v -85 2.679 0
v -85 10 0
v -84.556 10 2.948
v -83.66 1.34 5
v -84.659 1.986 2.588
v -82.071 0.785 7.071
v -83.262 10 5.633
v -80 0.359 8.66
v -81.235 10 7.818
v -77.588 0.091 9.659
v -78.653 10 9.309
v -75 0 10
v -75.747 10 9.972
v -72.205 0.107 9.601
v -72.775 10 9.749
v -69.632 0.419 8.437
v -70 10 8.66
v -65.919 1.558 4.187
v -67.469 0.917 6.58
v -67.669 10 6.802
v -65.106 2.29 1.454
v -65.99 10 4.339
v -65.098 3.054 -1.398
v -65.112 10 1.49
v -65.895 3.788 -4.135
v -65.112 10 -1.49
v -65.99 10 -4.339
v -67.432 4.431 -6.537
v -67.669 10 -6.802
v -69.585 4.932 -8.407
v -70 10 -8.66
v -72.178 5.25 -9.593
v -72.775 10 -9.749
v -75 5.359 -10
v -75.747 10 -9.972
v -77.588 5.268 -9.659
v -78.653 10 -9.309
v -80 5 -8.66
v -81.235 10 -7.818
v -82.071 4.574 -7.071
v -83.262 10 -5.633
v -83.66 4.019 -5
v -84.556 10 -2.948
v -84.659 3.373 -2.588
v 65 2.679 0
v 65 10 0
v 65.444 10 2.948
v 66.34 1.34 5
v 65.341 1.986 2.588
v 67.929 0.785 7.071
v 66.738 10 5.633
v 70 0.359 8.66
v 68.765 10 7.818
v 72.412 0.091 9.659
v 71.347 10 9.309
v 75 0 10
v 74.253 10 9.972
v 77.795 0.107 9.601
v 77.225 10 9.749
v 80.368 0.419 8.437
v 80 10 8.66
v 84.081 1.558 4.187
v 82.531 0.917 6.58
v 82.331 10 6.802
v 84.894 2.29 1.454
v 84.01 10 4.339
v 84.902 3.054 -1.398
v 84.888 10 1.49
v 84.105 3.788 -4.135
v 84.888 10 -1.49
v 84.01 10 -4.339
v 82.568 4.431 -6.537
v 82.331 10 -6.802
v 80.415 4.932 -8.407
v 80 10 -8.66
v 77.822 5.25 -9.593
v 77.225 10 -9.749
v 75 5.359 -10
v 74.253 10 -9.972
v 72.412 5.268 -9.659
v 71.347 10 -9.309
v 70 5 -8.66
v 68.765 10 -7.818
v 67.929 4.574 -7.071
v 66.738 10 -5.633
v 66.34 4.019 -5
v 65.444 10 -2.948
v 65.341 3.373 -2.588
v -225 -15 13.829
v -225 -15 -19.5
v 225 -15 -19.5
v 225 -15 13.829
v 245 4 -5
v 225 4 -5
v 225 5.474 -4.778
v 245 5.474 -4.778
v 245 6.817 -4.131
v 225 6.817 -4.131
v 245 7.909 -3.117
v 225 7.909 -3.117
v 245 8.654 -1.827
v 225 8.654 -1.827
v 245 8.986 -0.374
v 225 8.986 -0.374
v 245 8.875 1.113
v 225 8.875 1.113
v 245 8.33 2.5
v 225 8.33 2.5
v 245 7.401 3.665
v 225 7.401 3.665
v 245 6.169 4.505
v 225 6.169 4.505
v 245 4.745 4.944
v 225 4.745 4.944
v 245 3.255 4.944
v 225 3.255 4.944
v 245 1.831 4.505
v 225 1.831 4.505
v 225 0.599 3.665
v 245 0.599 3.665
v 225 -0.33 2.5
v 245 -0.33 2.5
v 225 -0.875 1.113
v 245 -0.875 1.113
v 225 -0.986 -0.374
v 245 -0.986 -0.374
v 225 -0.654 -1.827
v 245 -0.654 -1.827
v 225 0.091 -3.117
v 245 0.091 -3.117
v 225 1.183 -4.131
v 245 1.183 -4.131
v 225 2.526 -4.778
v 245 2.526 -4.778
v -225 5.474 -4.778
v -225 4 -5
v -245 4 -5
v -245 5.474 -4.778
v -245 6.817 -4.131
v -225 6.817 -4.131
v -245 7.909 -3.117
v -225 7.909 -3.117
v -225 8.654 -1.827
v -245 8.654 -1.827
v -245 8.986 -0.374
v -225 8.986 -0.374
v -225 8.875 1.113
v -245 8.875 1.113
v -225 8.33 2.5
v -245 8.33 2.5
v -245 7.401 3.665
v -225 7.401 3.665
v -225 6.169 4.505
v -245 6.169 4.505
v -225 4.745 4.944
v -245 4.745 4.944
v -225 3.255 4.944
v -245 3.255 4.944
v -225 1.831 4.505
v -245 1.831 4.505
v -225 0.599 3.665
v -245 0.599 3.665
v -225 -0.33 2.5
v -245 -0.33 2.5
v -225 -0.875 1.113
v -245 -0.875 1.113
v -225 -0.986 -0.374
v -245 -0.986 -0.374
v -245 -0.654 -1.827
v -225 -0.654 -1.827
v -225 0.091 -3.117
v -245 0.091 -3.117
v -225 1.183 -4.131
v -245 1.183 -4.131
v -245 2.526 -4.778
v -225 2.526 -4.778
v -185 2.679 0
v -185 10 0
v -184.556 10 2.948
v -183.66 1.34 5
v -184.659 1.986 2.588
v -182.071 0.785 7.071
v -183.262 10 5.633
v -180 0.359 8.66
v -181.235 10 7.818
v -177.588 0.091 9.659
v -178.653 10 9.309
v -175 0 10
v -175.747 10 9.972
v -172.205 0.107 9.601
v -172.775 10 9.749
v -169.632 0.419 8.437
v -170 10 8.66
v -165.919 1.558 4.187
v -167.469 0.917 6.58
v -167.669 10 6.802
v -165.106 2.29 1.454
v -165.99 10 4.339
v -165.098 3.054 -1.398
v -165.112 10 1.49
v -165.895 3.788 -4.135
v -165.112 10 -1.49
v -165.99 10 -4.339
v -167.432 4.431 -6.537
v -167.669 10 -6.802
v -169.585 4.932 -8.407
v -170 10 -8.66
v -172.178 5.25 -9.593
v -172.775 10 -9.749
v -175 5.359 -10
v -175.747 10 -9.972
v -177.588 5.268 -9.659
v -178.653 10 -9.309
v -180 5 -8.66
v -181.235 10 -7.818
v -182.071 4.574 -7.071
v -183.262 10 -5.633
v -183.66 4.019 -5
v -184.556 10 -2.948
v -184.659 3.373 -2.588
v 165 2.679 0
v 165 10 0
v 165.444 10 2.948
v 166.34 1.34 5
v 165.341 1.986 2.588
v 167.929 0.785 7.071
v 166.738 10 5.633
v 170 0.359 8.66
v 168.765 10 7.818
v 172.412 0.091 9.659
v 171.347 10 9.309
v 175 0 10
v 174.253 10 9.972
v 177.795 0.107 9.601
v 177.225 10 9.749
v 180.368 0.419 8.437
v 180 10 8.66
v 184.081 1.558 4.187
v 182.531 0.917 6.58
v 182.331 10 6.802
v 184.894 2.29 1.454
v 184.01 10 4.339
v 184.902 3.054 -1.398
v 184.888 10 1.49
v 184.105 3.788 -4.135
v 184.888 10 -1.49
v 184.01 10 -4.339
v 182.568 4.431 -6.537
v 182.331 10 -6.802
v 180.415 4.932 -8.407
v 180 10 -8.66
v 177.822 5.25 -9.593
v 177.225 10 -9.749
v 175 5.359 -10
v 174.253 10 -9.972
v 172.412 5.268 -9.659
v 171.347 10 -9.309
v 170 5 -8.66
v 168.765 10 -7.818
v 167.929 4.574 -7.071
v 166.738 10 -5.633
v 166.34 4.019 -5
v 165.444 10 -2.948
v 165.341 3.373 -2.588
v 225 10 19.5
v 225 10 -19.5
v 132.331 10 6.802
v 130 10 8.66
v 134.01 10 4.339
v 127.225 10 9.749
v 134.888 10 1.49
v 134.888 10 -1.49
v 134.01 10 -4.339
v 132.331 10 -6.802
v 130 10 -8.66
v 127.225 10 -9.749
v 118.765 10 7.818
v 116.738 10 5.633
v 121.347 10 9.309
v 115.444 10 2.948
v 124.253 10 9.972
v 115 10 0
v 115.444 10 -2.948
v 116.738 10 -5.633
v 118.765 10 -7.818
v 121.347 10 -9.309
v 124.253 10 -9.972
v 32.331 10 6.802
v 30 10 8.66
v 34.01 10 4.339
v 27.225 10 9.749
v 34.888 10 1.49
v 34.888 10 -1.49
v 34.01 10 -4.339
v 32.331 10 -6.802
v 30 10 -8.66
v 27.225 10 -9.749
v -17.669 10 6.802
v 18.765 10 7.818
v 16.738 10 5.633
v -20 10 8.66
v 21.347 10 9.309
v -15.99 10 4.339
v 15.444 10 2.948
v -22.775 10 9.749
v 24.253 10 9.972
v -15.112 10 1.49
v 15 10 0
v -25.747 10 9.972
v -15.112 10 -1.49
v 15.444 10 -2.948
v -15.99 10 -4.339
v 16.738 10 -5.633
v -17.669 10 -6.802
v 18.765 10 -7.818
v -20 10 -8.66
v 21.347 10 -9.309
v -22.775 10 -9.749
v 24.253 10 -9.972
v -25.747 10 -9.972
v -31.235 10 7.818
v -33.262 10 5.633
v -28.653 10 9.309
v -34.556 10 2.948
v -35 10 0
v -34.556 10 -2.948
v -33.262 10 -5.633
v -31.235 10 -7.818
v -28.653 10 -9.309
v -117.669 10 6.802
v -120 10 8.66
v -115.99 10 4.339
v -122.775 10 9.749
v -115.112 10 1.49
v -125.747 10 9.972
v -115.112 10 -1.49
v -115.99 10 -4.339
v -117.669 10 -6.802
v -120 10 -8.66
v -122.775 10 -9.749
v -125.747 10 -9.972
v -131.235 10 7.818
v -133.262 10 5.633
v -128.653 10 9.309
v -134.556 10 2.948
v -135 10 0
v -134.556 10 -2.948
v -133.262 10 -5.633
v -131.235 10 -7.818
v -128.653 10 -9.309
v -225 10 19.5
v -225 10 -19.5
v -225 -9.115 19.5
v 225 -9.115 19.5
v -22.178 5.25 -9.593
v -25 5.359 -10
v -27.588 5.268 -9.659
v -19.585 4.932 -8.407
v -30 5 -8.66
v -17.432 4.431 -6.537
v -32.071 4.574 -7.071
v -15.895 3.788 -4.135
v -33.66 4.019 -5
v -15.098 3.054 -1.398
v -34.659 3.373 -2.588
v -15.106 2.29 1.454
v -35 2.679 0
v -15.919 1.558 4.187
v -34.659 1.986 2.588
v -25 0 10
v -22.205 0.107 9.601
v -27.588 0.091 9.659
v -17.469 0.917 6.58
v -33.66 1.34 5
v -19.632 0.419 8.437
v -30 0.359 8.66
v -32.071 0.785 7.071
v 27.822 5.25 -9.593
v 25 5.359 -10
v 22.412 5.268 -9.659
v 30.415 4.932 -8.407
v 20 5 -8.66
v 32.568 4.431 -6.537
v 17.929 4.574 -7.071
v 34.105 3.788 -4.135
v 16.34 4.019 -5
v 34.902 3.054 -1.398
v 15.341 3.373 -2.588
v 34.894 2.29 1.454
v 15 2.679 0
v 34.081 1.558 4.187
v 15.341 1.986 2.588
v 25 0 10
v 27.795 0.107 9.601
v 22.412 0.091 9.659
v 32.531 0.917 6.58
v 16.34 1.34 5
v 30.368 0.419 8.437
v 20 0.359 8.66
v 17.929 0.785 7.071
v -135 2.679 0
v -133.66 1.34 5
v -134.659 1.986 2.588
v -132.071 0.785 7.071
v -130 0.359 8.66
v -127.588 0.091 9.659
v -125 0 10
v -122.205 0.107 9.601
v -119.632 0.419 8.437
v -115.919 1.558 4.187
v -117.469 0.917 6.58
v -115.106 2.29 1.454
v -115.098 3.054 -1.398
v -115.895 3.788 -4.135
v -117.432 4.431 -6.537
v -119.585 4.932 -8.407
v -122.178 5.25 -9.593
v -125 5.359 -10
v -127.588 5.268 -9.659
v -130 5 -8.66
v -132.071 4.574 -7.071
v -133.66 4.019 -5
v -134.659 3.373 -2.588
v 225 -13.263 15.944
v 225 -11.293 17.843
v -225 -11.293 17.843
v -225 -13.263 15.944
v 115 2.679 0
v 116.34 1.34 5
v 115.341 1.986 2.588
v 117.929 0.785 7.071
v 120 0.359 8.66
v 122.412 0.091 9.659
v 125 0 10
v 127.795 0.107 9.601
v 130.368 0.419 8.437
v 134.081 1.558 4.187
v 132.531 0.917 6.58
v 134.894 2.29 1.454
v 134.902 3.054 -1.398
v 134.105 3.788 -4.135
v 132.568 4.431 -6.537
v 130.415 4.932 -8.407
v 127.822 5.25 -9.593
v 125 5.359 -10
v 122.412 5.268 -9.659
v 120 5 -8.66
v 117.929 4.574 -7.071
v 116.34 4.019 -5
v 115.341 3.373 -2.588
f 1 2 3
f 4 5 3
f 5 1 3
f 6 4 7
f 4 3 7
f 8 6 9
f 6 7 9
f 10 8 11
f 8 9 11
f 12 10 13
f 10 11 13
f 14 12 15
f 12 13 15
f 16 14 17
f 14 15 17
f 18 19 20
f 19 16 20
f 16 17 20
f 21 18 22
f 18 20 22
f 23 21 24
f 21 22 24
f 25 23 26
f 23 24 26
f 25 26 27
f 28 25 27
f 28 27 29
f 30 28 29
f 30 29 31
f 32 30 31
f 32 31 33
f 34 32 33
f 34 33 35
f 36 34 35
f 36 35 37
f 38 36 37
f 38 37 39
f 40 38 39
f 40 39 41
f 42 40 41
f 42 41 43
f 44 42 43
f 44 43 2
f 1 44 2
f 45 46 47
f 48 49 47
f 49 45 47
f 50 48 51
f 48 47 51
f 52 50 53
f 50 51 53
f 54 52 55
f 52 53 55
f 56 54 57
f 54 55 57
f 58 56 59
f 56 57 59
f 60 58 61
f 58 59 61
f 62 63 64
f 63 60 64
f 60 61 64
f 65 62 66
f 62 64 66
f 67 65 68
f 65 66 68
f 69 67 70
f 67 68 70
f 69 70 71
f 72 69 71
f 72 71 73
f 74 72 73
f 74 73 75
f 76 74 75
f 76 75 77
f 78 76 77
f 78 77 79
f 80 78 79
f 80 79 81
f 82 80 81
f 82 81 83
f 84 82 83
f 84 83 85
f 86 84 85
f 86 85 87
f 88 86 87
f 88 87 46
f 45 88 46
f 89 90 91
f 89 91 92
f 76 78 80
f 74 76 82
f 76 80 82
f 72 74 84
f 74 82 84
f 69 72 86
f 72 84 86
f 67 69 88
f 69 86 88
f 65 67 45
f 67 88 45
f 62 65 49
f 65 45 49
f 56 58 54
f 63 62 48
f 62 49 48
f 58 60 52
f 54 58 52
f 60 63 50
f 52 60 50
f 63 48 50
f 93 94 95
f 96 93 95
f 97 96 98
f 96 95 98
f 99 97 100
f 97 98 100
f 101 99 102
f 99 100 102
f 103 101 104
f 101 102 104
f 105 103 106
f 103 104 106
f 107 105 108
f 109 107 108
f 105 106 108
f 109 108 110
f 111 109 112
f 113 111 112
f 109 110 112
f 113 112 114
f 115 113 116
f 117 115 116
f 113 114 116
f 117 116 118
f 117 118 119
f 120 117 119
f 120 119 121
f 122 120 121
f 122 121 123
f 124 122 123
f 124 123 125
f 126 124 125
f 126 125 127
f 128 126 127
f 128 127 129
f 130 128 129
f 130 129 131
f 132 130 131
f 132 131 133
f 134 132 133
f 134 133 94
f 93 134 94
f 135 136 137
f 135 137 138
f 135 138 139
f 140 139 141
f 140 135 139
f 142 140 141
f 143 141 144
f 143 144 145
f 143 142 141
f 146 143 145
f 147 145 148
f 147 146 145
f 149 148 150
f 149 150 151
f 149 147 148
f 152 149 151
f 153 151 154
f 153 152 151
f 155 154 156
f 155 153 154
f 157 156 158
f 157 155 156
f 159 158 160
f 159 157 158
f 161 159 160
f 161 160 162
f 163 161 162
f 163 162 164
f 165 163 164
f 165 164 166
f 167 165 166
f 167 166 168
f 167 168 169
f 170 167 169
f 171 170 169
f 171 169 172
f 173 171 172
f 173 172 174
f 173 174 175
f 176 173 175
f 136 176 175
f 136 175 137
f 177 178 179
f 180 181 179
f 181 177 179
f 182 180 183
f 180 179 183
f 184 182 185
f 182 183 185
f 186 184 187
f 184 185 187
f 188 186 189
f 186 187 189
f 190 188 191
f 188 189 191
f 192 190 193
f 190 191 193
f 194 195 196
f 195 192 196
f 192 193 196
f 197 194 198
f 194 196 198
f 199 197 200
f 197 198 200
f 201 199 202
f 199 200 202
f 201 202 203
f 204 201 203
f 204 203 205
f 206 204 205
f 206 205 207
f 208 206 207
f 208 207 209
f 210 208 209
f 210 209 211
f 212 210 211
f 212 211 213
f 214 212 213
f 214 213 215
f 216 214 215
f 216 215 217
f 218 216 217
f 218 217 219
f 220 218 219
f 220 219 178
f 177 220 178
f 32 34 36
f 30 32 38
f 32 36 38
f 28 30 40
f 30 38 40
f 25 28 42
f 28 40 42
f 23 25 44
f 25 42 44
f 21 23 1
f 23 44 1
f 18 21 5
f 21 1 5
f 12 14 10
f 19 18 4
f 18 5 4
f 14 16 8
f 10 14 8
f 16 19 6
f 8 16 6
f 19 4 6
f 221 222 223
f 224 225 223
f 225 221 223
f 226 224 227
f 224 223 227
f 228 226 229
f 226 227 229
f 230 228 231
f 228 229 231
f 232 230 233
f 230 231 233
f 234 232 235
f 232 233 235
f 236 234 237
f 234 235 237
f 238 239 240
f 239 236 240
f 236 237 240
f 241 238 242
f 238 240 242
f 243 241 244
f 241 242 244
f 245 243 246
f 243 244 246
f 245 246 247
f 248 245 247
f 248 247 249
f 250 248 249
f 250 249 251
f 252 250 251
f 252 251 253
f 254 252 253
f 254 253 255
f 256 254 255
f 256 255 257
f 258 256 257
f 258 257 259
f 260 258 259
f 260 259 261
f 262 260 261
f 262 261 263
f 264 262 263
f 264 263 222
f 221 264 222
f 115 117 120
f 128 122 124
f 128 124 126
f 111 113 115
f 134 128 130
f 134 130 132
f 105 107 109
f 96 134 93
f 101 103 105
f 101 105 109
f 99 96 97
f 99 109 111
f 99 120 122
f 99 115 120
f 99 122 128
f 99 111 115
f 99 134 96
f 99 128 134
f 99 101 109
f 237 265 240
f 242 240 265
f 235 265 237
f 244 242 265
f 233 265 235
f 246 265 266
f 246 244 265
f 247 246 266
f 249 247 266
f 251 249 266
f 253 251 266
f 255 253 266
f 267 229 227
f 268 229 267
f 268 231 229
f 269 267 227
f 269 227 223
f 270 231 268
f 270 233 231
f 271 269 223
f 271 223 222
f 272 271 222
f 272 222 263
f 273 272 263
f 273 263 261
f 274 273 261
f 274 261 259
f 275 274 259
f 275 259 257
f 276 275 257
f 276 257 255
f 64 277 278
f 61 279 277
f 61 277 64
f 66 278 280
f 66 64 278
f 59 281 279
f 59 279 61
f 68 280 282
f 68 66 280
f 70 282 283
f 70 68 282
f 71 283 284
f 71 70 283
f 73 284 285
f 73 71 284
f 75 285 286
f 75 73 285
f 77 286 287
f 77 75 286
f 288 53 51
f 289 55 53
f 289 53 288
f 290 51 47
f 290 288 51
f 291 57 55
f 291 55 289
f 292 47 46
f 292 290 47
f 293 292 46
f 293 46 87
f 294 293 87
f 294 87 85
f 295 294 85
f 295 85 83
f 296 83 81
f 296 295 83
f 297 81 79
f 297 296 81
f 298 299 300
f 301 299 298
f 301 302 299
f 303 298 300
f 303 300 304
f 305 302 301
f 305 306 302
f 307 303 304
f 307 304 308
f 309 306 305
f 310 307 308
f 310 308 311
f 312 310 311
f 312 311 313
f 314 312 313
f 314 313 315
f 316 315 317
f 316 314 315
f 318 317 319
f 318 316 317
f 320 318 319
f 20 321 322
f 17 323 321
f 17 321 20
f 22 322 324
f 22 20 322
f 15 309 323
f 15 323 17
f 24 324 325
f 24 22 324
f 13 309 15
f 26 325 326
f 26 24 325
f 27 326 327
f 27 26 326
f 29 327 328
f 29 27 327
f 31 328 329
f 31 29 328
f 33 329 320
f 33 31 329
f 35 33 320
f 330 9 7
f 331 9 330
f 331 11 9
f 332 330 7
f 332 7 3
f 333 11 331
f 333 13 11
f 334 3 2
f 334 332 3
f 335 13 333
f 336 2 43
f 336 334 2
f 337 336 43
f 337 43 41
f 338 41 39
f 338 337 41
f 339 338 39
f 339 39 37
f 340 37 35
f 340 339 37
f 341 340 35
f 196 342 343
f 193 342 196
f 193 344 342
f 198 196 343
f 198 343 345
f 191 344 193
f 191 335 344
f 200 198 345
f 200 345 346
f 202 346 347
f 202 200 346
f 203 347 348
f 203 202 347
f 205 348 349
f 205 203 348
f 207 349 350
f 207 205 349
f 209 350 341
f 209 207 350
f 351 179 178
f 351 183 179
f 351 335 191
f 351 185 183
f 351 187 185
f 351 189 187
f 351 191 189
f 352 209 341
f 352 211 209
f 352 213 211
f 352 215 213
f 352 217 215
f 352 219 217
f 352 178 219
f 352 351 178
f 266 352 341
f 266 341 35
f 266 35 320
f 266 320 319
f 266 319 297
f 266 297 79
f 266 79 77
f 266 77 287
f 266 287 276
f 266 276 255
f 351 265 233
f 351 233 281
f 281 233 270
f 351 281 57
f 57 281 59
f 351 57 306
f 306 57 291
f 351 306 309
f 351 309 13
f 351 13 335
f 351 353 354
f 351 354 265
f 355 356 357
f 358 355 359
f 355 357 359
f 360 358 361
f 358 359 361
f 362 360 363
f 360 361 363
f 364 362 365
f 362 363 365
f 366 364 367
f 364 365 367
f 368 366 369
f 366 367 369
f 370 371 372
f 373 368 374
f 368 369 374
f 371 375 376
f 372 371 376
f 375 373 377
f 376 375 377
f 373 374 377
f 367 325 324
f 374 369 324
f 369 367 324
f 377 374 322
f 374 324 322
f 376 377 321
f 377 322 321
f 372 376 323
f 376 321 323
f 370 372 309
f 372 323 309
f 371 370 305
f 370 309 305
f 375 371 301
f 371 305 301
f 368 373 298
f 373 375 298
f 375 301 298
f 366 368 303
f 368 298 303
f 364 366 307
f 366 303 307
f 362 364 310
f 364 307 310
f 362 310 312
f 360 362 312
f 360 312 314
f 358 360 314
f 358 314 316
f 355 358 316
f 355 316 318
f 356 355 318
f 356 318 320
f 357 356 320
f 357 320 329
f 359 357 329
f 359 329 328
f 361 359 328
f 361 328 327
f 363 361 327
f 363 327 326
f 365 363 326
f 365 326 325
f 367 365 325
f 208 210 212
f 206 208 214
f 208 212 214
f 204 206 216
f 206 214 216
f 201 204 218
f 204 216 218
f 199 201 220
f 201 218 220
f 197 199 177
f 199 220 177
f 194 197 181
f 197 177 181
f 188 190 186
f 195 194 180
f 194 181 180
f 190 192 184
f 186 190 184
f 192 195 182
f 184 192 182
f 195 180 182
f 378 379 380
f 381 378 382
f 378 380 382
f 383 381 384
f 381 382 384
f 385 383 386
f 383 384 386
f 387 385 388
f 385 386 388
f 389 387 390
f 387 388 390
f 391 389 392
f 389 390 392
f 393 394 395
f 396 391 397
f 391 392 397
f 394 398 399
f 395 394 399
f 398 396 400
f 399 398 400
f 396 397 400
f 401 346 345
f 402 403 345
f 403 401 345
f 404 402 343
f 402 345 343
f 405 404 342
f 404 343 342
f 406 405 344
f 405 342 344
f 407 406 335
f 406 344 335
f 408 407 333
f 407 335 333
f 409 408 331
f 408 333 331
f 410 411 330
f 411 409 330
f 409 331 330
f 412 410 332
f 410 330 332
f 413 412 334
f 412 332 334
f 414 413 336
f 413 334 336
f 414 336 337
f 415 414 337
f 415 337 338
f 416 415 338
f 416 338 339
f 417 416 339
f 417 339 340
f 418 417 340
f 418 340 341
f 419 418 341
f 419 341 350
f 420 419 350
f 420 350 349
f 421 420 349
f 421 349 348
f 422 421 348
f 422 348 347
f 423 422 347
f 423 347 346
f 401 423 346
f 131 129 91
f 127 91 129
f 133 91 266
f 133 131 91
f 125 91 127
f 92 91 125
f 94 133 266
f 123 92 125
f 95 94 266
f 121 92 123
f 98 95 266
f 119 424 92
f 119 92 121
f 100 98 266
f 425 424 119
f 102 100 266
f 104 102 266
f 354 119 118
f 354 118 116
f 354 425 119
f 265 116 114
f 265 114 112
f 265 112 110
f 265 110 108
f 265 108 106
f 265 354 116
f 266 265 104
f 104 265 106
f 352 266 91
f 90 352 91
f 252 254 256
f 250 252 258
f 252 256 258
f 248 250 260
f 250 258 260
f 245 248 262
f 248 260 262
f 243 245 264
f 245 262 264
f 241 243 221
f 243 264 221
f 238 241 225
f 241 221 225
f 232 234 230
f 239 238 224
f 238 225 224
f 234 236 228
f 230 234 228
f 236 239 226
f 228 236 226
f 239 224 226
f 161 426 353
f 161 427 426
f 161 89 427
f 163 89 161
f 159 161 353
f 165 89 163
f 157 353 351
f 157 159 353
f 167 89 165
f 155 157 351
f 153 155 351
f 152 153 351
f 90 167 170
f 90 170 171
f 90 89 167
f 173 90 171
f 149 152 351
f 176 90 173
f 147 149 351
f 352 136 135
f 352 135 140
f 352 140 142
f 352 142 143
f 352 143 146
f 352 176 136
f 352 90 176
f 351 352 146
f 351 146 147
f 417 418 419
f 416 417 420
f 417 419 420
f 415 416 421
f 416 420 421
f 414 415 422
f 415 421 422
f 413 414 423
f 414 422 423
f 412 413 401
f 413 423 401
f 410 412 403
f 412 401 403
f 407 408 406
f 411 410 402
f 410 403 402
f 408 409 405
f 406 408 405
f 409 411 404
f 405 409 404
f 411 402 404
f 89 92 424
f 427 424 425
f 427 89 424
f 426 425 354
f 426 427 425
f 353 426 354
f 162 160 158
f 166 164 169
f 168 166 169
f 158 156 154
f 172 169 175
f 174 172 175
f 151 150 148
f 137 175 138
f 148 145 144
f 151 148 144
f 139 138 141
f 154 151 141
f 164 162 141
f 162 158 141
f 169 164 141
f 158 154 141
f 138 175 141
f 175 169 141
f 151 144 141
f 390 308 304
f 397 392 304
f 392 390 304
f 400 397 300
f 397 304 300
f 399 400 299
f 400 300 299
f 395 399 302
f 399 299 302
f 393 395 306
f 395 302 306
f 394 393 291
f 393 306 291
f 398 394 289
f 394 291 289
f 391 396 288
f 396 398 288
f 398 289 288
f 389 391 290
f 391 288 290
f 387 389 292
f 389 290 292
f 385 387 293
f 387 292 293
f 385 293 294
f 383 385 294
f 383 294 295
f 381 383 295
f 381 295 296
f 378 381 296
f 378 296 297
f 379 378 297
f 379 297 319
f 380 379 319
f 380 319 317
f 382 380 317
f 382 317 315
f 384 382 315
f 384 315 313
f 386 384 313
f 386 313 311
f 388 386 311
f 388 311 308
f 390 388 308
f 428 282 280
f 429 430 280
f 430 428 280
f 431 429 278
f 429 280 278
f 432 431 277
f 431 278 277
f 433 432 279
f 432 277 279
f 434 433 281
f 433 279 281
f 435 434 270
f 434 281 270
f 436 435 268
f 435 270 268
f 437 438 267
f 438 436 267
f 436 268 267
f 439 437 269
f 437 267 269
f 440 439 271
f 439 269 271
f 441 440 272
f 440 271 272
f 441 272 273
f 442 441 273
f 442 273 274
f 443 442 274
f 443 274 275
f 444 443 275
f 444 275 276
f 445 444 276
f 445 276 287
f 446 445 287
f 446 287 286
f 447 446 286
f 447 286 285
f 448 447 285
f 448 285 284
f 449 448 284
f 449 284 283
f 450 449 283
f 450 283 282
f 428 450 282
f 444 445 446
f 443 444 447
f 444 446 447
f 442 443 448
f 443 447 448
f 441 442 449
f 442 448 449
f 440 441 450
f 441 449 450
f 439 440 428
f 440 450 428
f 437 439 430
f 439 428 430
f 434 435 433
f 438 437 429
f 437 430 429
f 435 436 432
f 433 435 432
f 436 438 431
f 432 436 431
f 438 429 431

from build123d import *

# Parameters (mm, degrees)
SKETCH1_W                       = 450
SKETCH1_H                       = 20
BOSS_EXTRUDE1_DEPTH             = 14
SKETCH2_R                       = 10
CUT_EXTRUDE1_DEPTH              = 10
LPATTERN1_COUNT                 = 8
LPATTERN1_PITCH                 = 50
SKETCH3_R                       = 5
BOSS_EXTRUDE2_DEPTH             = 20
FILLET1_R                       = 14
BOSS_EXTRUDE3_REACH             = 472.315
BOSS_EXTRUDE4_REACH             = 247.603
BOSS_EXTRUDE4_DIRECTION_2_REACH = 247.603


with BuildPart() as part:
    # Sketch1 → Boss-Extrude1 (new, symmetric)
    with BuildSketch(Plane.XY):
        Rectangle(SKETCH1_W, SKETCH1_H)
    extrude(amount=BOSS_EXTRUDE1_DEPTH, both=True)

    # Sketch2 → Cut-Extrude1 (cut)
    with BuildSketch(Plane(origin=(0, 10, 0), x_dir=(1, 0, 0), z_dir=(0, 1, 0))):
        with Locations(Location((-175, 0, 0), (0, 0, 180))):
            Circle(SKETCH2_R)
    cut_extrude1 = extrude(amount=-CUT_EXTRUDE1_DEPTH, mode=Mode.SUBTRACT)

    # LPattern1: Cut-Extrude1 ×8
    with Locations(*[(i * LPATTERN1_PITCH, 0, 0) for i in range(1, LPATTERN1_COUNT)]):
        add(cut_extrude1, mode=Mode.SUBTRACT)

    # Sketch3 → Boss-Extrude2 (add)
    with BuildSketch(Plane(origin=(225, 0, 0), x_dir=(0, 0, -1), z_dir=(1, 0, 0))):
        with Locations((0, 4)):
            Circle(SKETCH3_R)
    boss_extrude2 = extrude(amount=BOSS_EXTRUDE2_DEPTH)

    # Mirror1: Boss-Extrude2 across plane
    add(boss_extrude2.mirror(Plane(origin=(0, 0, 0), x_dir=(0, 0, 1), z_dir=(1, 0, 0))))

    # Fillet1
    fillet1_edges = [part.edges().sort_by_distance(p)[0] for p in [
        (0, -10, 14),
        (0, -10, -14),
    ]]
    fillet(fillet1_edges, radius=FILLET1_R - 0.0001)  # a hair under: the kernel refuses the full size

    # Boss-Extrude3: up to this face of the body (flat: up to its plane)
    boss_extrude3_end = Plane(part.part.faces().sort_by_distance((225, 6.99995, -13.655906989))[0])
    # Sketch5 → Boss-Extrude3 (add, up to the picked face)
    with BuildSketch(Plane.ZY.offset(225), mode=Mode.PRIVATE) as boss_extrude3_sk1:
        Polygon((10, 0), (-10, 0), (-10, 5.358983849), align=None)
    boss_extrude3_tool1 = split(extrude(boss_extrude3_sk1.sketch, amount=-BOSS_EXTRUDE3_REACH, mode=Mode.PRIVATE), bisect_by=boss_extrude3_end, keep=Keep.BOTH, mode=Mode.PRIVATE)
    add(boss_extrude3_tool1.solids().sort_by(Axis((-225, 1.786328, -3.333333), (1, 0, 0)))[0])

    # Boss-Extrude4: up to this face of the body (flat: up to its plane)
    boss_extrude4_end = Plane(part.part.faces().sort_by_distance((-225, 6.99995, -13.655906989))[0])
    # Sketch6 → Boss-Extrude4 (add, up to the picked face)
    with BuildSketch(Plane(origin=(0, 0, 0), x_dir=(0, 0, -1), z_dir=(1, 0, 0)), mode=Mode.PRIVATE) as boss_extrude4_sk1:
        with BuildLine():
            Line((-19.5, 10), (-14, 10))
            Line((-14, 10), (-14, 4))
            ThreePointArc((-14, 4), (-9.899494937, -5.899494937), (0, -10))
            ThreePointArc((0, -10), (9.899494937, -5.899494937), (14, 4))
            Line((14, 4), (14, 10))
            Line((14, 10), (19.5, 10))
            Line((19.5, 10), (19.5, -15))
            Line((19.5, -15), (-13.829316686, -15))
            ThreePointArc((-13.829316686, -15), (-16.922455665, -12.305842336), (-19.5, -9.114877049))
            Line((-19.5, -9.114877049), (-19.5, 10))
        make_face()
    boss_extrude4_tool1 = split(extrude(boss_extrude4_sk1.sketch, amount=-BOSS_EXTRUDE4_REACH, mode=Mode.PRIVATE), bisect_by=boss_extrude4_end, keep=Keep.BOTH, mode=Mode.PRIVATE)
    add(boss_extrude4_tool1.solids().sort_by(Axis((0, 0.442561, 19.036751), (-1, 0, 0)))[0])

    # Boss-Extrude4 direction 2: up to this face of the body (flat: up to its plane)
    boss_extrude4_direction_2_end = Plane(part.part.faces().sort_by_distance((225, 6.99995, -13.655906989))[0])
    # Sketch6 → Boss-Extrude4 direction 2 (add, up to the picked face)
    with BuildSketch(Plane(origin=(0, 0, 0), x_dir=(0, 0, -1), z_dir=(1, 0, 0)), mode=Mode.PRIVATE) as boss_extrude4_direction_2_sk1:
        with BuildLine():
            Line((-19.5, 10), (-14, 10))
            Line((-14, 10), (-14, 4))
            ThreePointArc((-14, 4), (-9.899494937, -5.899494937), (0, -10))
            ThreePointArc((0, -10), (9.899494937, -5.899494937), (14, 4))
            Line((14, 4), (14, 10))
            Line((14, 10), (19.5, 10))
            Line((19.5, 10), (19.5, -15))
            Line((19.5, -15), (-13.829316686, -15))
            ThreePointArc((-13.829316686, -15), (-16.922455665, -12.305842336), (-19.5, -9.114877049))
            Line((-19.5, -9.114877049), (-19.5, 10))
        make_face()
    boss_extrude4_direction_2_tool1 = split(extrude(boss_extrude4_direction_2_sk1.sketch, amount=BOSS_EXTRUDE4_DIRECTION_2_REACH, mode=Mode.PRIVATE), bisect_by=boss_extrude4_direction_2_end, keep=Keep.BOTH, mode=Mode.PRIVATE)
    add(boss_extrude4_direction_2_tool1.solids().sort_by(Axis((0, 0.442561, 19.036751), (1, 0, 0)))[0])


solid = part.part
